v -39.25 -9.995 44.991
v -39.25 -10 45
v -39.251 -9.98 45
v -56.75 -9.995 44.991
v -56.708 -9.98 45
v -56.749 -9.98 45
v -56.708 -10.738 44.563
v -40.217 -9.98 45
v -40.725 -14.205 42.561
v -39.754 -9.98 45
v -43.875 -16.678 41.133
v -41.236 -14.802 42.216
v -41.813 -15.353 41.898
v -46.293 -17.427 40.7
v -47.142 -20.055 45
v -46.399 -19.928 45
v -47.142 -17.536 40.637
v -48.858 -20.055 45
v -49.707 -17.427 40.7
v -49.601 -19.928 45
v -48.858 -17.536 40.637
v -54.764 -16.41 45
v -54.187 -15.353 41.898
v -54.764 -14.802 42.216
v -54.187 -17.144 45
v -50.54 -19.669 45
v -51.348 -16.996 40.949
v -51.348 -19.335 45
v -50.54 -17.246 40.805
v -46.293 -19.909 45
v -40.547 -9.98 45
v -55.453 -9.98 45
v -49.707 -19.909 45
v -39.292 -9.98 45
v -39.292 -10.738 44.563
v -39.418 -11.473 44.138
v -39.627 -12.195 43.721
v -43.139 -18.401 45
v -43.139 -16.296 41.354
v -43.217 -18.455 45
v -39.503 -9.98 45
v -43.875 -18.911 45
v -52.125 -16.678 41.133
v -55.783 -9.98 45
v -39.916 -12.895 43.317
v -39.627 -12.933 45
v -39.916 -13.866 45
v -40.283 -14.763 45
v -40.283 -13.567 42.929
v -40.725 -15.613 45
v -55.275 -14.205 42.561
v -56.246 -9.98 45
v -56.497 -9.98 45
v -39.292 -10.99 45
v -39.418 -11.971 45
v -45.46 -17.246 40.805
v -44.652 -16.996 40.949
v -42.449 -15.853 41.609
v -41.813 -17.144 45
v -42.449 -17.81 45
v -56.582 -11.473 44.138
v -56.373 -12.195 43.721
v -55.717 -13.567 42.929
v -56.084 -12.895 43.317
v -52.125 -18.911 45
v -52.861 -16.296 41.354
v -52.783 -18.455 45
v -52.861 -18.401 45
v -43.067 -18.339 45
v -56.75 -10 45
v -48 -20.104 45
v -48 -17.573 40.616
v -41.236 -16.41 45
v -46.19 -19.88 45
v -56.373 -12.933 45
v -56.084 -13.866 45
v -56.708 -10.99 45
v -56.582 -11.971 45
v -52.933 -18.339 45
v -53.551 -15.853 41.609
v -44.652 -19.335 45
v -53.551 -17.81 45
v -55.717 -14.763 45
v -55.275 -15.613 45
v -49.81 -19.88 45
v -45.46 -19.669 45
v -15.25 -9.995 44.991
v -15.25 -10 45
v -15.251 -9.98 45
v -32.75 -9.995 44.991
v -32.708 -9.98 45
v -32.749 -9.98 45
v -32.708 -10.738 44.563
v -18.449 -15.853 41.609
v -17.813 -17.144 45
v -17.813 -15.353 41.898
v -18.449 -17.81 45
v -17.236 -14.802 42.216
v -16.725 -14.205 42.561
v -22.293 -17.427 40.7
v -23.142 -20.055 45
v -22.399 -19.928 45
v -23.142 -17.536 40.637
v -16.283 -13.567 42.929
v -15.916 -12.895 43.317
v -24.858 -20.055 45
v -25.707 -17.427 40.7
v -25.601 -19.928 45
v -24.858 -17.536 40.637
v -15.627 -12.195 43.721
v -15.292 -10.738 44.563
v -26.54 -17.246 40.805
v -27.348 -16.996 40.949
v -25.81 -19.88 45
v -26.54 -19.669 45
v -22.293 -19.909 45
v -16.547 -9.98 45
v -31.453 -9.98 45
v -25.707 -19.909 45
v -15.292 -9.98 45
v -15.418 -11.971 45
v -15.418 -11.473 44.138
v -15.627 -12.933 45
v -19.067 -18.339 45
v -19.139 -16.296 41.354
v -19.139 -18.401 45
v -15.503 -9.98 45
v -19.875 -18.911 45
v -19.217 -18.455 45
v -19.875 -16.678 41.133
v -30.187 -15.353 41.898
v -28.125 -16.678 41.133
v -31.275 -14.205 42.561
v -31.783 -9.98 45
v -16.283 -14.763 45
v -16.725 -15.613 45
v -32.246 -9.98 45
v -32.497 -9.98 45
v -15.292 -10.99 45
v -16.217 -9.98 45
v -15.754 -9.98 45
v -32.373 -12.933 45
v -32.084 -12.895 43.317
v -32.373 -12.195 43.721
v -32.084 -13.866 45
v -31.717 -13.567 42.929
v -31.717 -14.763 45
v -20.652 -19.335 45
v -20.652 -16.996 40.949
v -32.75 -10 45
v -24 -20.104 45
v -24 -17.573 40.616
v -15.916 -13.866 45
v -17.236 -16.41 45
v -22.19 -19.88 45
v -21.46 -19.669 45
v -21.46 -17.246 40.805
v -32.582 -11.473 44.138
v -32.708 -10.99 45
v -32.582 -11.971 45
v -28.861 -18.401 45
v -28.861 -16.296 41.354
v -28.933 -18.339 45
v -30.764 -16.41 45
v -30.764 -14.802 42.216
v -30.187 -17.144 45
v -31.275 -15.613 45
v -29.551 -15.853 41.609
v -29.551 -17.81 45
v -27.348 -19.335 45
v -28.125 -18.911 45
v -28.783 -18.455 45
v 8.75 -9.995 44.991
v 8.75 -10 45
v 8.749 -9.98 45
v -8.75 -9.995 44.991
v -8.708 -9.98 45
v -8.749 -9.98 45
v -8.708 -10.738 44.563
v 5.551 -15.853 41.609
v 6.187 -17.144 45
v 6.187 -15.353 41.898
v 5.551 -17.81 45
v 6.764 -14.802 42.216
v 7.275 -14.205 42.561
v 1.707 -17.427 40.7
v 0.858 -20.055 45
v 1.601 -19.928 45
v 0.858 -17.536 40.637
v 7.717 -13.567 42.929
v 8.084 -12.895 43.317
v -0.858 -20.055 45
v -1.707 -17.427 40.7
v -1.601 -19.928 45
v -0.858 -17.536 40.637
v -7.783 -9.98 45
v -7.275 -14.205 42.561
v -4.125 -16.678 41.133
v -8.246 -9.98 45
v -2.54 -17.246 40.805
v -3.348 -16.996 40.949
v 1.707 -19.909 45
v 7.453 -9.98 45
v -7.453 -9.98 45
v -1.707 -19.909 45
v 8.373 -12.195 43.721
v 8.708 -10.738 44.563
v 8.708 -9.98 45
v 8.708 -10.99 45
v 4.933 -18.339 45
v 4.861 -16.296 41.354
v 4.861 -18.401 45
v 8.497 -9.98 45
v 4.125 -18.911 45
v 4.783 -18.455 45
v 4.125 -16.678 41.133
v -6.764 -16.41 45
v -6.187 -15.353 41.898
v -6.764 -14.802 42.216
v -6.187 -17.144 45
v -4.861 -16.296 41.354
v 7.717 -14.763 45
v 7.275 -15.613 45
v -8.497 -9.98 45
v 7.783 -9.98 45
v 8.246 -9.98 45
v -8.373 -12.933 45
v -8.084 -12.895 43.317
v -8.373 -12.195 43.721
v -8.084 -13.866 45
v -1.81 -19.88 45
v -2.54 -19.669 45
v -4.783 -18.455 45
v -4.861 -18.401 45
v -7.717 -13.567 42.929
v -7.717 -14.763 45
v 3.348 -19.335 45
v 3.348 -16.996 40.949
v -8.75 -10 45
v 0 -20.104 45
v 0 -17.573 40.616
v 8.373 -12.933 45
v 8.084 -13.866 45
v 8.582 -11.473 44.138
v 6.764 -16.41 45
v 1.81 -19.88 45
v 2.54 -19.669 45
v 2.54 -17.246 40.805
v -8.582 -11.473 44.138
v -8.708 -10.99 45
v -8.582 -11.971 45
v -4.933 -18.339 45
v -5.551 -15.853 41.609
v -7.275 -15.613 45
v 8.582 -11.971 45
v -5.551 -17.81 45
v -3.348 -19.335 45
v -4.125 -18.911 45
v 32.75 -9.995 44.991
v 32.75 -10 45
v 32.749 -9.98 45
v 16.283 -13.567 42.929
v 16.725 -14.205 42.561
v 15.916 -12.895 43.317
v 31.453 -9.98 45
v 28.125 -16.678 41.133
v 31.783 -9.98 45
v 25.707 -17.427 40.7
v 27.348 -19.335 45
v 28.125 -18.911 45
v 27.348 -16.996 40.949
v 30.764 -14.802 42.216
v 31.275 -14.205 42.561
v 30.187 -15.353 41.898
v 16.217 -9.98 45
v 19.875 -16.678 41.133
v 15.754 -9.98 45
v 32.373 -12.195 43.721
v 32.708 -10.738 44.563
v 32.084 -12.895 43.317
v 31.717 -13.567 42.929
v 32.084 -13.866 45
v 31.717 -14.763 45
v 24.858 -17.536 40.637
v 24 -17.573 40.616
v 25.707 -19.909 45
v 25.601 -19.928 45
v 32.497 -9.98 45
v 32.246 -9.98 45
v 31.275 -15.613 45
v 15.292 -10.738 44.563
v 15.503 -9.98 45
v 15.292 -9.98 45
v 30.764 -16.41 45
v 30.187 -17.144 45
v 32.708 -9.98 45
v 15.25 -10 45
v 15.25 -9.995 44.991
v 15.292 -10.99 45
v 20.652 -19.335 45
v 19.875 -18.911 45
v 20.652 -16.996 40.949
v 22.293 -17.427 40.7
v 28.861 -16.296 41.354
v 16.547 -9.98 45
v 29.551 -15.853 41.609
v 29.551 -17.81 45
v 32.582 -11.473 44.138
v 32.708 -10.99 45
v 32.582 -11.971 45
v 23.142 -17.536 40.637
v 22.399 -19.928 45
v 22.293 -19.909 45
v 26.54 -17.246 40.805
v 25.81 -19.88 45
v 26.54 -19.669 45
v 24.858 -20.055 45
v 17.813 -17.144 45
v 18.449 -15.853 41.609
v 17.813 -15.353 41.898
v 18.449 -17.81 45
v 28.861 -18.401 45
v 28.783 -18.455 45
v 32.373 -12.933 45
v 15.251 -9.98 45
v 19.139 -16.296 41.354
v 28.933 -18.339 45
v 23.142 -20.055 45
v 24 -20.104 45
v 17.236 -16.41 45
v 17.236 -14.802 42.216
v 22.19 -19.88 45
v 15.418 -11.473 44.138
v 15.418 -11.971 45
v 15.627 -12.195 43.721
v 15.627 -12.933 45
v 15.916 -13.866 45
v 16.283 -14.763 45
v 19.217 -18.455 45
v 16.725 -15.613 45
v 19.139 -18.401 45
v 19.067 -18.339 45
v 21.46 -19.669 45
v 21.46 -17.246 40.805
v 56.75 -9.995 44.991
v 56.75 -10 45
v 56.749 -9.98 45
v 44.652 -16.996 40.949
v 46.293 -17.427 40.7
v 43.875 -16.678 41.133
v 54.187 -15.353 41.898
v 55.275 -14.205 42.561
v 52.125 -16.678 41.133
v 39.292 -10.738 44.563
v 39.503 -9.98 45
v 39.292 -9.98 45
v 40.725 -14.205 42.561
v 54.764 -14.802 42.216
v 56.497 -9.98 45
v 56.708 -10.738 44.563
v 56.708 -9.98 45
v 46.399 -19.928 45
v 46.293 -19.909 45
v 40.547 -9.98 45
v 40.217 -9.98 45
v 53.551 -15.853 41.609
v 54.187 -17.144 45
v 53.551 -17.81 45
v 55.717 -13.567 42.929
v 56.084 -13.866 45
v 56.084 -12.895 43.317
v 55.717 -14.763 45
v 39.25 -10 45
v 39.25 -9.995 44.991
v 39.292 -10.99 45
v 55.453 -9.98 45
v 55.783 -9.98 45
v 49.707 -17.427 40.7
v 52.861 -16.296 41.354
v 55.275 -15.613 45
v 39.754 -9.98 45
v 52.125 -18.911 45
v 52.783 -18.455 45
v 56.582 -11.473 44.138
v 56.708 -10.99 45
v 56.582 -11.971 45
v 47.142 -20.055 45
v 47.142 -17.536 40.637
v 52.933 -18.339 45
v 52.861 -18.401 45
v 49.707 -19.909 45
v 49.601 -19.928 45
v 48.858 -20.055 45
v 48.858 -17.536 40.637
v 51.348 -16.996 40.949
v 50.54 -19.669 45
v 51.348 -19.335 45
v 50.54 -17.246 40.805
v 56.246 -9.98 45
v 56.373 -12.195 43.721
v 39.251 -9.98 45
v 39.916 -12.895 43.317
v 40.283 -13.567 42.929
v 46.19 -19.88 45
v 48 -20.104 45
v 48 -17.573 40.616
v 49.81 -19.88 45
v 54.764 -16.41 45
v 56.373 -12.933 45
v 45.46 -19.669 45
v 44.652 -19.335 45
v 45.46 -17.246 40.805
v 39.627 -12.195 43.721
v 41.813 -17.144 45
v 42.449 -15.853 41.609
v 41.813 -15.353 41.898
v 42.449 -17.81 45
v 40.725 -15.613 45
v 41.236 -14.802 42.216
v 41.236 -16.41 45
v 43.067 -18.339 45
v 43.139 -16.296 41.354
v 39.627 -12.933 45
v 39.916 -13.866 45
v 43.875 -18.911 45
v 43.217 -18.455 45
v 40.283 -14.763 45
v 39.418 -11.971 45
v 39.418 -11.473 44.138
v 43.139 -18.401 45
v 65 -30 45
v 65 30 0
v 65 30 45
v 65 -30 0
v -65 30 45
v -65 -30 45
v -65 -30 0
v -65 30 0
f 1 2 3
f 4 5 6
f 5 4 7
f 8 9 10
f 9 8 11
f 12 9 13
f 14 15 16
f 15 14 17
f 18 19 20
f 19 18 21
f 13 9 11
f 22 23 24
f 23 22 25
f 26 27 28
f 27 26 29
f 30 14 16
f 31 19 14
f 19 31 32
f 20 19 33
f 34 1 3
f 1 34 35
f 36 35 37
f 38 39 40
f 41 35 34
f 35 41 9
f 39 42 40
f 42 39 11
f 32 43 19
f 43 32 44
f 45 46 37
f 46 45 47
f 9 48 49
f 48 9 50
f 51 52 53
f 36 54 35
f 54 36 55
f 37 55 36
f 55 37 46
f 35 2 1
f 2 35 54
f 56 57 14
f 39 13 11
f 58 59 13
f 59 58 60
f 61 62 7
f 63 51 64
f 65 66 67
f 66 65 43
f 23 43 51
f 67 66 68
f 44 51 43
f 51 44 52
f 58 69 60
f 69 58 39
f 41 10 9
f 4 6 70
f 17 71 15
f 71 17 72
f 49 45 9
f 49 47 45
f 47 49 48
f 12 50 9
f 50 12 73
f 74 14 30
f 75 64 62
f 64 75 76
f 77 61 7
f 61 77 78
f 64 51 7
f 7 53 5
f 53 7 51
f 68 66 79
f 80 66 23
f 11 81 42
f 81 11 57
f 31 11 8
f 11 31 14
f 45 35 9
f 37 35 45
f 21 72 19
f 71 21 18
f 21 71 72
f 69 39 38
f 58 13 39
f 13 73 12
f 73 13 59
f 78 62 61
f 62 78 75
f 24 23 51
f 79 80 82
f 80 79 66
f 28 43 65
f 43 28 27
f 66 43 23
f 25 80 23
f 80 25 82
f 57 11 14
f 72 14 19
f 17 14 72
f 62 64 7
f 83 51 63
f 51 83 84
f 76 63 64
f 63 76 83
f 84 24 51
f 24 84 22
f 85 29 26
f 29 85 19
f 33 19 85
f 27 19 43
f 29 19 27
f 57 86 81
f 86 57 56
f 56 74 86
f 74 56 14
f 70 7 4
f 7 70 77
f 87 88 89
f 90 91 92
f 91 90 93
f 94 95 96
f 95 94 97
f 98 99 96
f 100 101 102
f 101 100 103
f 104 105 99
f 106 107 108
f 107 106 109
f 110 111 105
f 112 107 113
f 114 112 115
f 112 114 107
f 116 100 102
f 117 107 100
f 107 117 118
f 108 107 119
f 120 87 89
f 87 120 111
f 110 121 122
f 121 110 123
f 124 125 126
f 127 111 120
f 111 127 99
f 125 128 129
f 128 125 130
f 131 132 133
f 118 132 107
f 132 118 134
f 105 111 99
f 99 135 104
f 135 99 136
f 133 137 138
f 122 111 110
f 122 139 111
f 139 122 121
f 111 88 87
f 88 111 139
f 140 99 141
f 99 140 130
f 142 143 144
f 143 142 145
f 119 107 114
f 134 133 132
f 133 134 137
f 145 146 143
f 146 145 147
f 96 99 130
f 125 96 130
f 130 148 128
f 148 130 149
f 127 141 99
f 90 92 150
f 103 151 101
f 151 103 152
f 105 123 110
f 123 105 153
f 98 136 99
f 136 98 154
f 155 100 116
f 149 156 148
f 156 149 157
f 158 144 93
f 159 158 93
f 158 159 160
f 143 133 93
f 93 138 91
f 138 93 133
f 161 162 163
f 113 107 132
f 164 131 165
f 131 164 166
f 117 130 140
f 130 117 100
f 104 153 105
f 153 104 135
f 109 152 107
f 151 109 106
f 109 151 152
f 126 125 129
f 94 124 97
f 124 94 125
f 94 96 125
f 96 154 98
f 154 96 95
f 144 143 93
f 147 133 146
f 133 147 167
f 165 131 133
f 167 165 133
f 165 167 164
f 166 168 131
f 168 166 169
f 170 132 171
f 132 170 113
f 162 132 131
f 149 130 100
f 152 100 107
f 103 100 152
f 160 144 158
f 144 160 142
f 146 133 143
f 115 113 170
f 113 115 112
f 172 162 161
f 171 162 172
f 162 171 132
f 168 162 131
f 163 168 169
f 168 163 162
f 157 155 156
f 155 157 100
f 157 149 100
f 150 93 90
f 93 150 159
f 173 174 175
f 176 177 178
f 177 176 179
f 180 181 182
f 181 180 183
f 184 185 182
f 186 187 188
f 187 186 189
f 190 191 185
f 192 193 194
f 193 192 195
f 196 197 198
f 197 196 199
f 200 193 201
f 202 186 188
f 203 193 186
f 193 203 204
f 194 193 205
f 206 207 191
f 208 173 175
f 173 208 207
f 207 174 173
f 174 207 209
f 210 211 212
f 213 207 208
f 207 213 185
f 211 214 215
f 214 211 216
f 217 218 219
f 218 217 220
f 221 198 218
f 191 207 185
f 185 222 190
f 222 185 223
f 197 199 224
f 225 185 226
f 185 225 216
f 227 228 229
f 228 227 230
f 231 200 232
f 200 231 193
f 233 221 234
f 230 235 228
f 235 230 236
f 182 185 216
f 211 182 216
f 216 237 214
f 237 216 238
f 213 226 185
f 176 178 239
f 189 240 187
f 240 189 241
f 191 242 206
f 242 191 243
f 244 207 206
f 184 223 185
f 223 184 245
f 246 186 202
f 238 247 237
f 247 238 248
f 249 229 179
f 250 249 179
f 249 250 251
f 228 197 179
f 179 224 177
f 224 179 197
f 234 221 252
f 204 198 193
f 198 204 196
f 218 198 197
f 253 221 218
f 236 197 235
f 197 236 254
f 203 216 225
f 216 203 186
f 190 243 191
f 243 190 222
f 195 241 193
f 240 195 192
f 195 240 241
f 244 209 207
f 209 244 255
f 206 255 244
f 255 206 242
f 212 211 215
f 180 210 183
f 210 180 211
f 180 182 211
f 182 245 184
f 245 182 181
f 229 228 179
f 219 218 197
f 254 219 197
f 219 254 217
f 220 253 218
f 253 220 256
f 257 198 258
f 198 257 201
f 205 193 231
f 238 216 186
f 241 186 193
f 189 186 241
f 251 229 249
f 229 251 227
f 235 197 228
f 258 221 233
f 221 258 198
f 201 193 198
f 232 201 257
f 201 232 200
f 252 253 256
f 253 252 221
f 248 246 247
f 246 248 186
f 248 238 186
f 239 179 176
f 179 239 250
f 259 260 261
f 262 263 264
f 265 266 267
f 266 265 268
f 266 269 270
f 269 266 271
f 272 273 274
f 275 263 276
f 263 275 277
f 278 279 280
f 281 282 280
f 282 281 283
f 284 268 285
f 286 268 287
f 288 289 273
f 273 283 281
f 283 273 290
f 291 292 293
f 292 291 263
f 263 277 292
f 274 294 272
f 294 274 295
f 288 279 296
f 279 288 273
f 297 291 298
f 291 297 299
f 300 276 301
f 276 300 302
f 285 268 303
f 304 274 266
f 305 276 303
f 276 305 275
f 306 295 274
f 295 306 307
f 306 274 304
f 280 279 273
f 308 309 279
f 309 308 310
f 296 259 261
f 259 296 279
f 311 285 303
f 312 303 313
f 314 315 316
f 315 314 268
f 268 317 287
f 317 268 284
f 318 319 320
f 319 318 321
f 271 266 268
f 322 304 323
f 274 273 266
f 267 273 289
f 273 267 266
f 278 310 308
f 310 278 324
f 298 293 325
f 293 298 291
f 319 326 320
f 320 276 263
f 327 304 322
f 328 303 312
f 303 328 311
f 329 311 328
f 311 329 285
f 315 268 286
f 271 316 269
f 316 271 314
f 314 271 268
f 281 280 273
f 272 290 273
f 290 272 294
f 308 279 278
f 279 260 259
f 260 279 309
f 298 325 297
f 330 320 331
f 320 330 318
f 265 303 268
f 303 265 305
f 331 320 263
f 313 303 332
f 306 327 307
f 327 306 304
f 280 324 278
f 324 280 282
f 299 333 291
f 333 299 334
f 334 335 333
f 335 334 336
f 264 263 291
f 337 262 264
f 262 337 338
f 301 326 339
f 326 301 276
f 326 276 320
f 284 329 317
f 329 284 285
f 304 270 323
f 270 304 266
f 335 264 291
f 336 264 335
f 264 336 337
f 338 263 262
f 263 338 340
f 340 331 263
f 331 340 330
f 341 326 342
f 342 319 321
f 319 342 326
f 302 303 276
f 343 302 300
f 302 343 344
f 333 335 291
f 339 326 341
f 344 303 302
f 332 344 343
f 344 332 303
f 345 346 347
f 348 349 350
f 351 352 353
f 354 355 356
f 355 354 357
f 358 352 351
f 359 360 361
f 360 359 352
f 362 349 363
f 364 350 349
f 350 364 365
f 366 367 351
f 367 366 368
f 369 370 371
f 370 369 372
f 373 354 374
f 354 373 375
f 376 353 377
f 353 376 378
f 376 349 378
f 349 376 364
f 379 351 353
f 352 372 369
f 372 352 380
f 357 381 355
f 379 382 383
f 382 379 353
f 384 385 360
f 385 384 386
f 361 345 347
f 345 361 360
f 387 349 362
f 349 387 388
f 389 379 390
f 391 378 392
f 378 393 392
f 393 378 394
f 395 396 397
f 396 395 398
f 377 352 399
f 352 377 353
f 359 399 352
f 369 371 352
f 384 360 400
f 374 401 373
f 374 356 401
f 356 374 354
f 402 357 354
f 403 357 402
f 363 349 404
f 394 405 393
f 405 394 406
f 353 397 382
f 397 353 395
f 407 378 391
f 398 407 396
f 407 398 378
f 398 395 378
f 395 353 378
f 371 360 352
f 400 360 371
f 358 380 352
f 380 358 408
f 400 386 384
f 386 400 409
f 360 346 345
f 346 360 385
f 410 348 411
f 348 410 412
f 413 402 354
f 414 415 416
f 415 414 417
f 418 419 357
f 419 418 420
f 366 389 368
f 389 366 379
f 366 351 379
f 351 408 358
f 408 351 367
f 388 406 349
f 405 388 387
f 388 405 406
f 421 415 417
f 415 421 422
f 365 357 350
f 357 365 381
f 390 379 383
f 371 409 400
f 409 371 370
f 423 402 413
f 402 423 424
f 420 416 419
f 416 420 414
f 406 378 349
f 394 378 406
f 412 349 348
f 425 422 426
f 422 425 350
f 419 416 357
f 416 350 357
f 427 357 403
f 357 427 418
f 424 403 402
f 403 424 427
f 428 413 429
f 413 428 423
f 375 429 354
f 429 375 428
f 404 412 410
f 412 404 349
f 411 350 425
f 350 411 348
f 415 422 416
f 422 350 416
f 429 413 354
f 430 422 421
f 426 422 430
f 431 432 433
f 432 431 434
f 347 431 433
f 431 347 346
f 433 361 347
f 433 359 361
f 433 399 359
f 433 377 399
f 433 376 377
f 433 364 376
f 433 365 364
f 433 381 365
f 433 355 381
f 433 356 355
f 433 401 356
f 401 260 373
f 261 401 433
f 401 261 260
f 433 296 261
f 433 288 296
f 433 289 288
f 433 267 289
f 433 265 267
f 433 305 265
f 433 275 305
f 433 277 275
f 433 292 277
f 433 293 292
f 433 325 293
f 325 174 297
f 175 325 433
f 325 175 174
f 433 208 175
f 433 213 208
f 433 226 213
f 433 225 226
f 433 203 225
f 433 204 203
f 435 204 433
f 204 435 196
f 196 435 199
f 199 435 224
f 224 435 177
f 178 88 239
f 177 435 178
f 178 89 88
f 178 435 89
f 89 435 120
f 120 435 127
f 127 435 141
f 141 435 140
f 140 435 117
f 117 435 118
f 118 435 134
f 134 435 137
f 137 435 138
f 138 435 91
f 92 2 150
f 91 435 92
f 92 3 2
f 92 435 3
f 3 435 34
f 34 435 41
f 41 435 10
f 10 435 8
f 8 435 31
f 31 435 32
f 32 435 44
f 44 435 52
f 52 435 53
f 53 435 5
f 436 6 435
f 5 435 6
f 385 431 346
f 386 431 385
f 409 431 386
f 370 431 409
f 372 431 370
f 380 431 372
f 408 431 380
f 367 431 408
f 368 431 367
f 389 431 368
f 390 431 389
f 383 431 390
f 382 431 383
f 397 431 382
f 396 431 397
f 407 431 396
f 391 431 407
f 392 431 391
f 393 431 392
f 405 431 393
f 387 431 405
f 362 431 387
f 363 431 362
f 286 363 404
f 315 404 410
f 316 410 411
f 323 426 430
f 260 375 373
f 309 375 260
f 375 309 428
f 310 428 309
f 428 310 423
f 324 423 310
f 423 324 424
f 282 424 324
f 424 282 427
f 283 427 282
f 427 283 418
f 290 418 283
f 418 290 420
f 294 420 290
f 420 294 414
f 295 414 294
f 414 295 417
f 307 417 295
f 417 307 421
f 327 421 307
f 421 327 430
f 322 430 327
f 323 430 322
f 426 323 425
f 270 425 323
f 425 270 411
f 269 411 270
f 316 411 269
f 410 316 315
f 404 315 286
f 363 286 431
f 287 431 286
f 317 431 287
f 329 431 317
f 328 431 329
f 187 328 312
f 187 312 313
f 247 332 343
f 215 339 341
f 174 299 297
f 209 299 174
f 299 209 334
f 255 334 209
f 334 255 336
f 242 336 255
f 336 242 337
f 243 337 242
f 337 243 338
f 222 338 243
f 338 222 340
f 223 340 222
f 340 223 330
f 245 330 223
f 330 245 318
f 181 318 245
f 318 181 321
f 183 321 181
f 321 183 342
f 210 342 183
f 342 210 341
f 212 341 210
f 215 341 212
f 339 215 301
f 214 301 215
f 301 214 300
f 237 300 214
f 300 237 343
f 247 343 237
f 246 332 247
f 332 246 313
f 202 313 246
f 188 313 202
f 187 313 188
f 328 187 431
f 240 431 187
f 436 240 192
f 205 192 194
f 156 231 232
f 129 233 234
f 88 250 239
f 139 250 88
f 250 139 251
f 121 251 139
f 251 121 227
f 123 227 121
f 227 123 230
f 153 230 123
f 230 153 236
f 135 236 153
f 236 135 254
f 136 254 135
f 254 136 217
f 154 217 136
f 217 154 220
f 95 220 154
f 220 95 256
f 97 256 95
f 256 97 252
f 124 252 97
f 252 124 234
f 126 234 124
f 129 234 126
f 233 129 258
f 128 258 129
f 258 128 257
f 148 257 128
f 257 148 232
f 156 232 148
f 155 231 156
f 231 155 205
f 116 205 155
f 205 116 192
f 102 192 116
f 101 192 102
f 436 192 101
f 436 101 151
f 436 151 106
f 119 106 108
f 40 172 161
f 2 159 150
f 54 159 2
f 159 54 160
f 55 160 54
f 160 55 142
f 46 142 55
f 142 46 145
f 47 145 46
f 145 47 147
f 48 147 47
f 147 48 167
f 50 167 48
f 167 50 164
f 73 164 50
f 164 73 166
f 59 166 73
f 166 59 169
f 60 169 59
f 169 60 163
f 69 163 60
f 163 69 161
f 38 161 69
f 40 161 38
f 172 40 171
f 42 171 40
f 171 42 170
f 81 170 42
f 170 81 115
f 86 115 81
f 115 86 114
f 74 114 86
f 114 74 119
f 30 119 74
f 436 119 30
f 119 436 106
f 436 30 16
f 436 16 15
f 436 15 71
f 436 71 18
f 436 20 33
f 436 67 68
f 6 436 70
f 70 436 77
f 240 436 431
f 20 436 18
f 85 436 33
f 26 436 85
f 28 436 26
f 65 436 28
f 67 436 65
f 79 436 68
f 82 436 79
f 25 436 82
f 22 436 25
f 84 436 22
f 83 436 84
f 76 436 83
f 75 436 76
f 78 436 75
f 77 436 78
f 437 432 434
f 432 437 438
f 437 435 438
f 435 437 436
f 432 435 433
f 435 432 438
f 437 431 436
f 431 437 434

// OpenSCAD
// 15mL Conical Tube Rack
// Designed for volume reading and pipetting.
// Features 5 holes tilted 30 degrees in the YZ plane.

// Dimensions
L = 130;             // Length along X (mm)
W = 60;              // Depth along Y (mm)
H = 45;              // Height along Z (mm)

num_holes = 5;       // Number of tube holes
spacing = 24;        // Spacing between hole centers along X (mm)
hole_d = 17.5;       // Diameter of the holes (mm)
hole_depth = 40;     // Depth of the holes along their axis (mm)

tilt_angle = 30;     // Tilt angle from vertical (degrees)
y_offset = -10;      // Y-coordinate where the hole axis meets the top face

$fn = 64;

// Calculation for centering the holes along X
// The holes are centered on the block, so the first hole is at -(spacing * (num_holes-1)/2)
hole_x_start = -(spacing * (num_holes - 1) / 2);

// The block is centered on X and Y, sitting on Z=0.
// X range: [-65, 65]
// Y range: [-30, 30]
// Z range: [0, 45]

difference() {
    // The main block
    translate([-L/2, -W/2, 0])
        cube([L, W, H]);

    // The holes
    for (i = [0 : num_holes - 1]) {
        // Calculate X position for this specific hole
        x_pos = hole_x_start + (i * spacing);
        
        // We move to the top face (Z = H) and the specified Y offset.
        // Then we rotate the cylinder. 
        // To tilt 30 degrees from vertical (Z) towards +Y, we rotate around the X axis.
        // In OpenSCAD, a positive rotation around X moves the Z axis towards the Y axis.
        translate([x_pos, y_offset, H]) 
        rotate([30, 0, 0])
            // We use a cylinder to represent the hole.
            // To ensure the bottom is flat and perpendicular to the axis, 
            // we use a cylinder of the specified depth.
            // We translate it slightly in Z to ensure it cuts through the top face cleanly.
            translate([0, 0, -0.01]) 
                cylinder(h = hole_depth + 0.01, d = hole_d);
    }
}
